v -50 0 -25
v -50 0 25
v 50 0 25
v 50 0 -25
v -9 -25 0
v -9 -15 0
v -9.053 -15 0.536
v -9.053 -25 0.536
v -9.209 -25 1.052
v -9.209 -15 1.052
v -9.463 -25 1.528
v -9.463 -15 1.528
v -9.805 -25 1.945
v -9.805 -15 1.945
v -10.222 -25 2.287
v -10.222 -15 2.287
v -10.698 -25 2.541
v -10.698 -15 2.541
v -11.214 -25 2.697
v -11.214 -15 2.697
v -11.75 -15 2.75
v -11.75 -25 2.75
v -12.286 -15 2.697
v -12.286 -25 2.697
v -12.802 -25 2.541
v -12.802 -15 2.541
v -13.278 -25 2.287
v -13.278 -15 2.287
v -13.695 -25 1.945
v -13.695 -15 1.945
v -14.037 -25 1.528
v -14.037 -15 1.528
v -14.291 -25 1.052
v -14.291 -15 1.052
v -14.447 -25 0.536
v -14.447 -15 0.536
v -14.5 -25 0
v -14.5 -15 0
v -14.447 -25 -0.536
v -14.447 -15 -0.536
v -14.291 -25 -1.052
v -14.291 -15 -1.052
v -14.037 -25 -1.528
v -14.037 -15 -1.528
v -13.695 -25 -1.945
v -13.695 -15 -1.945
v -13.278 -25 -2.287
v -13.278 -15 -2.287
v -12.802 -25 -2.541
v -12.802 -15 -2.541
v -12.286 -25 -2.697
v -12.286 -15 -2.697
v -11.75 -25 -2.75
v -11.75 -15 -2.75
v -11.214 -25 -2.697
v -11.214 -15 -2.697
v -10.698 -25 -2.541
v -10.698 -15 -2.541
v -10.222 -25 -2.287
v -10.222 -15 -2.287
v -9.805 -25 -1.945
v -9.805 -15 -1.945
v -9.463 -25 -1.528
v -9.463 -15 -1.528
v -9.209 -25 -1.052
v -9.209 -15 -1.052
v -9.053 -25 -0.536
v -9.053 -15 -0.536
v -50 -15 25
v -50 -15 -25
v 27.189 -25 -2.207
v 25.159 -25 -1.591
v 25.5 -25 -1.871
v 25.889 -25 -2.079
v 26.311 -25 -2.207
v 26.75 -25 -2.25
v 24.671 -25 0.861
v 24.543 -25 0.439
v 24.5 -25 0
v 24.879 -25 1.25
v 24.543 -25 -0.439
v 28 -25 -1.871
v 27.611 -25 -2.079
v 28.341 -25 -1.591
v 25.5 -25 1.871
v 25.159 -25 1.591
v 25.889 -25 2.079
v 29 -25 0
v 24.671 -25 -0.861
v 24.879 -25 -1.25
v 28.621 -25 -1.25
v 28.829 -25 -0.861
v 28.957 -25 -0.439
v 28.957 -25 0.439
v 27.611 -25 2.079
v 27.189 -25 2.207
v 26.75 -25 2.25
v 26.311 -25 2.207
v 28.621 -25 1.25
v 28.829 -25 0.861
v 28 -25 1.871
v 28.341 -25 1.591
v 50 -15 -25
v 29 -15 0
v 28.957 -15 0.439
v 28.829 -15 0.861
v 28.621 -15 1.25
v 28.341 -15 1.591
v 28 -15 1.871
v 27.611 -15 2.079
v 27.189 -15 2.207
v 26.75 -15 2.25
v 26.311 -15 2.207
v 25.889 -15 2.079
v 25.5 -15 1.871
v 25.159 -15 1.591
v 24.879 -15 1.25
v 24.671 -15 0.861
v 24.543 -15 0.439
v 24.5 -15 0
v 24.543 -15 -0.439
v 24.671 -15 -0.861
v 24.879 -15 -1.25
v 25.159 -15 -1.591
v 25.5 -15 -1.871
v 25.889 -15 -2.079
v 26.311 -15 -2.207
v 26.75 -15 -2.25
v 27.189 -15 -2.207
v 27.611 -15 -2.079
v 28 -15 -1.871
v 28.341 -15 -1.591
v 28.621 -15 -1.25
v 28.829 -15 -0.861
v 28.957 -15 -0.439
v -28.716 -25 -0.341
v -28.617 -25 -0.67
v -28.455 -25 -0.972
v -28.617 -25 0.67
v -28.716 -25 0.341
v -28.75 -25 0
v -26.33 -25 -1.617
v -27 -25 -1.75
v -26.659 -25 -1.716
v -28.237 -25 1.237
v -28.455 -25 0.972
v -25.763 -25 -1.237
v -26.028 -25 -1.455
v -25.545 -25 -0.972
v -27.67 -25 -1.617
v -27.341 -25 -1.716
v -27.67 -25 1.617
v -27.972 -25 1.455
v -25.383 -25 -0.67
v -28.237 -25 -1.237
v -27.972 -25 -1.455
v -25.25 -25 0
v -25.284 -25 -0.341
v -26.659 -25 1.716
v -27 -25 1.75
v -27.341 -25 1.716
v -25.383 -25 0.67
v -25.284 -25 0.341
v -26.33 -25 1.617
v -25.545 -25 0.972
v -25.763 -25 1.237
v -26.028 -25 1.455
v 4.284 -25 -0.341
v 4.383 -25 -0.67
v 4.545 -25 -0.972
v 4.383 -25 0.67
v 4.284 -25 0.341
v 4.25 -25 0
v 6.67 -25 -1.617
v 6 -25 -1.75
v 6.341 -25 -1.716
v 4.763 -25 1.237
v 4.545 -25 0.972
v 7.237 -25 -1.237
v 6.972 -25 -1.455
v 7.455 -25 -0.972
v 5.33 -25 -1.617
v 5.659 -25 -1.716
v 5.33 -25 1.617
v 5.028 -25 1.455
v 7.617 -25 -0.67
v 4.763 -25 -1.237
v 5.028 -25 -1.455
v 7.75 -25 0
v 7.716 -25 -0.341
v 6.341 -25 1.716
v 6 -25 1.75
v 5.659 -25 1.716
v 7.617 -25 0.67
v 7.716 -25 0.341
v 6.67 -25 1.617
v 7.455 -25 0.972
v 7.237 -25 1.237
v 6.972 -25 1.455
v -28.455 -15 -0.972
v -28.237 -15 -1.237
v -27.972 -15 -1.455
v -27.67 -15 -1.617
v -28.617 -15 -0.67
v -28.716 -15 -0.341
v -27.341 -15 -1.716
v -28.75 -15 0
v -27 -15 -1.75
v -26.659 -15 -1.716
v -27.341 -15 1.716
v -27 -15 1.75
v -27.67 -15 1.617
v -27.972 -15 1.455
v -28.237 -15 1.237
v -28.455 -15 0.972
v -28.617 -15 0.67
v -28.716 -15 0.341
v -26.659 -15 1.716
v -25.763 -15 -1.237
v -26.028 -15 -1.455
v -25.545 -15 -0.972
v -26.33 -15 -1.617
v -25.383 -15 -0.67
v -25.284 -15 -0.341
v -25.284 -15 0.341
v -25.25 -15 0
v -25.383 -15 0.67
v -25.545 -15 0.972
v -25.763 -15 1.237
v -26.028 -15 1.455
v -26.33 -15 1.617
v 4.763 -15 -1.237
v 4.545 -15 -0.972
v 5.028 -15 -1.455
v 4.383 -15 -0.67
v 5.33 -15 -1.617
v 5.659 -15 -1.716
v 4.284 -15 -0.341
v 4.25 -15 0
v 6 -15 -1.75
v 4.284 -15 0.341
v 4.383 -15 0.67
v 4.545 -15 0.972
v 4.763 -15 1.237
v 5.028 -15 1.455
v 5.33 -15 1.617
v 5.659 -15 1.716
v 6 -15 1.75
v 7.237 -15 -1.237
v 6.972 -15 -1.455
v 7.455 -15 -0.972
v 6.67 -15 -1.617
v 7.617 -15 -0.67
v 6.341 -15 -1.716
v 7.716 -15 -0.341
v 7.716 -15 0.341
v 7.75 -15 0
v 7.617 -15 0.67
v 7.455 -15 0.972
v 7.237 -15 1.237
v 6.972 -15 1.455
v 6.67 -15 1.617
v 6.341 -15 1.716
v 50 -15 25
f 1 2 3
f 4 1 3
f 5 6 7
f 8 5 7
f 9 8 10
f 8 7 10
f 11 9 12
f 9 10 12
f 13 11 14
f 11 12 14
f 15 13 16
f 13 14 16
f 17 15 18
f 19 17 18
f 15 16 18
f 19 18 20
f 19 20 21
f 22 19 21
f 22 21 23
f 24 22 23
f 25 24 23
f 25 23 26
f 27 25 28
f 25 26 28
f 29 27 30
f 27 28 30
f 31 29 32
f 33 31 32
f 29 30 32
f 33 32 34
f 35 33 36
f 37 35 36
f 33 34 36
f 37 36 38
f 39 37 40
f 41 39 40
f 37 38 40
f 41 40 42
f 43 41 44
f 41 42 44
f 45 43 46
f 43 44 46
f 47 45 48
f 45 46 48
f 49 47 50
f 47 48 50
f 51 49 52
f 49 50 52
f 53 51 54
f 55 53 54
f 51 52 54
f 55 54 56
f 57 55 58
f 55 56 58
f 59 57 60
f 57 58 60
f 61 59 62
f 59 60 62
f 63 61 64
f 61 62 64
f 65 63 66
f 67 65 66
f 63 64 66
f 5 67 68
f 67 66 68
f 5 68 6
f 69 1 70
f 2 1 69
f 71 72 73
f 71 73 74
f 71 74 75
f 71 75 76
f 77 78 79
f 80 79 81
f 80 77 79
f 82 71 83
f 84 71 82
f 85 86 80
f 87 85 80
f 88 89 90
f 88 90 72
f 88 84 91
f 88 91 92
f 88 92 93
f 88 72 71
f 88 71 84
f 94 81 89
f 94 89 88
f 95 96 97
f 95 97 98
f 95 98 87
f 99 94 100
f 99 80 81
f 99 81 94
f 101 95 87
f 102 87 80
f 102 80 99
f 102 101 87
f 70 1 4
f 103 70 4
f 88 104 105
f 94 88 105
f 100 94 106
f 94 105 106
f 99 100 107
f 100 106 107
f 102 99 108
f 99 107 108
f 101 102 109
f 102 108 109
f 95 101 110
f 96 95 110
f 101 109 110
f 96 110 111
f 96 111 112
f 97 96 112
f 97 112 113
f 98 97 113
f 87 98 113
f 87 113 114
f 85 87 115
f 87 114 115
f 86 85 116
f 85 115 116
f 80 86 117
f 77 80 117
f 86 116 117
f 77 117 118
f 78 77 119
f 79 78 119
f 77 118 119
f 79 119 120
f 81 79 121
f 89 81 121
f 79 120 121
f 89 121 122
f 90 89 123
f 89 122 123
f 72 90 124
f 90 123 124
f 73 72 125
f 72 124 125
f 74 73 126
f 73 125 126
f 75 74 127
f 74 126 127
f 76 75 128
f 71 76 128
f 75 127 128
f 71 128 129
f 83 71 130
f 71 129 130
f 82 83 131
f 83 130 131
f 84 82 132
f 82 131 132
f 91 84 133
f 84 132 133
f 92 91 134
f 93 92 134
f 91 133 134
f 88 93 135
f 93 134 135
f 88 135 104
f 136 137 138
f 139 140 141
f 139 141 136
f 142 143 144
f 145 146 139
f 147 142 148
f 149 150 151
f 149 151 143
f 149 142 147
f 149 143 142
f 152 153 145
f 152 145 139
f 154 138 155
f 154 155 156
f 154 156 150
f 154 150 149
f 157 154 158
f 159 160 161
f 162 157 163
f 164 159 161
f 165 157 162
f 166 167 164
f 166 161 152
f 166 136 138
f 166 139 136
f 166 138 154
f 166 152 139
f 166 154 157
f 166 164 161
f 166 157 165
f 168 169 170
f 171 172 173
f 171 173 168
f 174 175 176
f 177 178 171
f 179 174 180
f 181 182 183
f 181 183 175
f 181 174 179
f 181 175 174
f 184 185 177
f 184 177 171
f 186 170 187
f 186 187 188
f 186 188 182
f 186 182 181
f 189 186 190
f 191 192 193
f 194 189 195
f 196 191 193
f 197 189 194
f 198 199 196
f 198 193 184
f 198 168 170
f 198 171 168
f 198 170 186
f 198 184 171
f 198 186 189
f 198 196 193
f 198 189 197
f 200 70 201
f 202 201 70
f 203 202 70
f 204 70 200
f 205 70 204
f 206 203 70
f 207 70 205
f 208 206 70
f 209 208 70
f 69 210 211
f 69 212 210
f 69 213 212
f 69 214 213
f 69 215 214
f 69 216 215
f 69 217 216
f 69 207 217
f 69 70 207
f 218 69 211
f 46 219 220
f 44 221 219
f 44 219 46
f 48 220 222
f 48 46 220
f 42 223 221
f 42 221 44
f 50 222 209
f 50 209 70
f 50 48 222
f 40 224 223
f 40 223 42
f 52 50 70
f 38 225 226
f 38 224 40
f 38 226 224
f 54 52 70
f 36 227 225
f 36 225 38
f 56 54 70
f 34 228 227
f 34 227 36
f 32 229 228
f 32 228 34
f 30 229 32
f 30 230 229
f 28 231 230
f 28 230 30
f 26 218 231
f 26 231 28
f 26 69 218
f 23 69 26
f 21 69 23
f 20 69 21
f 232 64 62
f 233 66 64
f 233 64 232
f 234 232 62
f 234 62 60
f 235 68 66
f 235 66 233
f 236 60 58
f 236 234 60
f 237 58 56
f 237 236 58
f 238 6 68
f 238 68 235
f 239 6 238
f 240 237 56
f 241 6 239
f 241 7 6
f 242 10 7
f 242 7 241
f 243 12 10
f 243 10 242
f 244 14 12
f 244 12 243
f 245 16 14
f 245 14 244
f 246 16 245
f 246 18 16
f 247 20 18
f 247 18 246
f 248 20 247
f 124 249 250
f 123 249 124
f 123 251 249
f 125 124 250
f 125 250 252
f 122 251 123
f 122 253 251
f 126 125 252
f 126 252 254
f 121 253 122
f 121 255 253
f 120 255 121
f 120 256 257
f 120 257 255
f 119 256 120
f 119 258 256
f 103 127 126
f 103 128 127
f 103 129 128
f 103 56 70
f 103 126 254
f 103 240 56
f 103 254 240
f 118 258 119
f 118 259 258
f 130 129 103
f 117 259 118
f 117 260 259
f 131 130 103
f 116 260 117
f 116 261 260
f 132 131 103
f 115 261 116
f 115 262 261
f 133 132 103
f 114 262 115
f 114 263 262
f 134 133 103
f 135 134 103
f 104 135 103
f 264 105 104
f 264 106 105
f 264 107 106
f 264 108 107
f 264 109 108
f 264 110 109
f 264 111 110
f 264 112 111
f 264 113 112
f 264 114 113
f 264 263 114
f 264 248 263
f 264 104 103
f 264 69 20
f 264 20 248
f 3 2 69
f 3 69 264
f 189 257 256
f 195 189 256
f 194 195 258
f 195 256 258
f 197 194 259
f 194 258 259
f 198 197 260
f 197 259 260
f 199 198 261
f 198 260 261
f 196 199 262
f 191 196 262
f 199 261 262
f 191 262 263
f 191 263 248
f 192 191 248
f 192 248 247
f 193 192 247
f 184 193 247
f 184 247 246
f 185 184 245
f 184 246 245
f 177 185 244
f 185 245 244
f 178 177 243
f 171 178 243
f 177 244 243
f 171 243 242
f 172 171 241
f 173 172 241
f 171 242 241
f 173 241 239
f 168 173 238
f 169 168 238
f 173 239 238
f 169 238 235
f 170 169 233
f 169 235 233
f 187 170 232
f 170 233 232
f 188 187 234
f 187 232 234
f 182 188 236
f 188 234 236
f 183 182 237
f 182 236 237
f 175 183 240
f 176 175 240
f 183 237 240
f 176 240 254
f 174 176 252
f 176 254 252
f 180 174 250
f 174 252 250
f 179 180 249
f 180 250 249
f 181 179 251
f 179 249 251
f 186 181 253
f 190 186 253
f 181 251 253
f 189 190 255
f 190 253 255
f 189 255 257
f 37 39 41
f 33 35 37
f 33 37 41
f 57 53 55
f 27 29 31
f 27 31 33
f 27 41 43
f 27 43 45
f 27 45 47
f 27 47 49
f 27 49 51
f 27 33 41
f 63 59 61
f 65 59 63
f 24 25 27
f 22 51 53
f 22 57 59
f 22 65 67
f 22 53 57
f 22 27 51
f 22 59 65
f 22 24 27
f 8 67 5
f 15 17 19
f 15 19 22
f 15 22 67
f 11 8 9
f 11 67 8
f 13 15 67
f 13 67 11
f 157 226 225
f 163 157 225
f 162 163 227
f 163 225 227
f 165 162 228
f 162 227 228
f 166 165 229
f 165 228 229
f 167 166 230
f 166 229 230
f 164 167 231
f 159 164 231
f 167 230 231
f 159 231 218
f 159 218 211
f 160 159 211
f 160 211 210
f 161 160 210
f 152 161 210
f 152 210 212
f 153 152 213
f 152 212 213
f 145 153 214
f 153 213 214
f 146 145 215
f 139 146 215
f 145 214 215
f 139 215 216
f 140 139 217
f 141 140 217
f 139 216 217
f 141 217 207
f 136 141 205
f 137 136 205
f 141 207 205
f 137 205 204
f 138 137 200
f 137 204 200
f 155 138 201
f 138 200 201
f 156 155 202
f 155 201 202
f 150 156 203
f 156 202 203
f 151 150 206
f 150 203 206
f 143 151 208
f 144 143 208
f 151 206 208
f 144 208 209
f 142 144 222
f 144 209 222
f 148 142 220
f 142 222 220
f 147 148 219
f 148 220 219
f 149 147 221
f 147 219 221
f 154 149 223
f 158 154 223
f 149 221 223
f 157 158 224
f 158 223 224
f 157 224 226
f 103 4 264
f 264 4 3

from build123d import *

# Parameters (mm, degrees)
F0_W     = 100
F0_H     = 50
F1_DEPTH = 15
F2_R     = 1.75
F3_DEPTH = 10
F4_R     = 2.75
F5_DEPTH = 10
F6_R     = 1.75
F7_DEPTH = 10
F8_R     = 2.25
F9_DEPTH = 10


with BuildPart() as f1:
    # F0 (on Front) → F1 (new body)
    with BuildSketch(Plane.XZ):
        Rectangle(F0_W, F0_H)
    extrude(amount=F1_DEPTH)

    # F2 (on face) → F3 (join)
    with BuildSketch(Plane.XZ.offset(15)):
        with Locations((-27, 0)):
            Circle(F2_R)
    extrude(amount=F3_DEPTH)

    # F4 (on face) → F5 (join)
    with BuildSketch(Plane.XZ.offset(15)):
        with Locations((-11.75, 0)):
            Circle(F4_R)
    extrude(amount=F5_DEPTH)

    # F6 (on face) → F7 (join)
    with BuildSketch(Plane.XZ.offset(15)):
        with Locations((6, 0)):
            Circle(F6_R)
    extrude(amount=F7_DEPTH)

    # F8 (on face) → F9 (join)
    with BuildSketch(Plane.XZ.offset(15)):
        with Locations((26.75, 0)):
            Circle(F8_R)
    extrude(amount=F9_DEPTH)


solid = f1.part
